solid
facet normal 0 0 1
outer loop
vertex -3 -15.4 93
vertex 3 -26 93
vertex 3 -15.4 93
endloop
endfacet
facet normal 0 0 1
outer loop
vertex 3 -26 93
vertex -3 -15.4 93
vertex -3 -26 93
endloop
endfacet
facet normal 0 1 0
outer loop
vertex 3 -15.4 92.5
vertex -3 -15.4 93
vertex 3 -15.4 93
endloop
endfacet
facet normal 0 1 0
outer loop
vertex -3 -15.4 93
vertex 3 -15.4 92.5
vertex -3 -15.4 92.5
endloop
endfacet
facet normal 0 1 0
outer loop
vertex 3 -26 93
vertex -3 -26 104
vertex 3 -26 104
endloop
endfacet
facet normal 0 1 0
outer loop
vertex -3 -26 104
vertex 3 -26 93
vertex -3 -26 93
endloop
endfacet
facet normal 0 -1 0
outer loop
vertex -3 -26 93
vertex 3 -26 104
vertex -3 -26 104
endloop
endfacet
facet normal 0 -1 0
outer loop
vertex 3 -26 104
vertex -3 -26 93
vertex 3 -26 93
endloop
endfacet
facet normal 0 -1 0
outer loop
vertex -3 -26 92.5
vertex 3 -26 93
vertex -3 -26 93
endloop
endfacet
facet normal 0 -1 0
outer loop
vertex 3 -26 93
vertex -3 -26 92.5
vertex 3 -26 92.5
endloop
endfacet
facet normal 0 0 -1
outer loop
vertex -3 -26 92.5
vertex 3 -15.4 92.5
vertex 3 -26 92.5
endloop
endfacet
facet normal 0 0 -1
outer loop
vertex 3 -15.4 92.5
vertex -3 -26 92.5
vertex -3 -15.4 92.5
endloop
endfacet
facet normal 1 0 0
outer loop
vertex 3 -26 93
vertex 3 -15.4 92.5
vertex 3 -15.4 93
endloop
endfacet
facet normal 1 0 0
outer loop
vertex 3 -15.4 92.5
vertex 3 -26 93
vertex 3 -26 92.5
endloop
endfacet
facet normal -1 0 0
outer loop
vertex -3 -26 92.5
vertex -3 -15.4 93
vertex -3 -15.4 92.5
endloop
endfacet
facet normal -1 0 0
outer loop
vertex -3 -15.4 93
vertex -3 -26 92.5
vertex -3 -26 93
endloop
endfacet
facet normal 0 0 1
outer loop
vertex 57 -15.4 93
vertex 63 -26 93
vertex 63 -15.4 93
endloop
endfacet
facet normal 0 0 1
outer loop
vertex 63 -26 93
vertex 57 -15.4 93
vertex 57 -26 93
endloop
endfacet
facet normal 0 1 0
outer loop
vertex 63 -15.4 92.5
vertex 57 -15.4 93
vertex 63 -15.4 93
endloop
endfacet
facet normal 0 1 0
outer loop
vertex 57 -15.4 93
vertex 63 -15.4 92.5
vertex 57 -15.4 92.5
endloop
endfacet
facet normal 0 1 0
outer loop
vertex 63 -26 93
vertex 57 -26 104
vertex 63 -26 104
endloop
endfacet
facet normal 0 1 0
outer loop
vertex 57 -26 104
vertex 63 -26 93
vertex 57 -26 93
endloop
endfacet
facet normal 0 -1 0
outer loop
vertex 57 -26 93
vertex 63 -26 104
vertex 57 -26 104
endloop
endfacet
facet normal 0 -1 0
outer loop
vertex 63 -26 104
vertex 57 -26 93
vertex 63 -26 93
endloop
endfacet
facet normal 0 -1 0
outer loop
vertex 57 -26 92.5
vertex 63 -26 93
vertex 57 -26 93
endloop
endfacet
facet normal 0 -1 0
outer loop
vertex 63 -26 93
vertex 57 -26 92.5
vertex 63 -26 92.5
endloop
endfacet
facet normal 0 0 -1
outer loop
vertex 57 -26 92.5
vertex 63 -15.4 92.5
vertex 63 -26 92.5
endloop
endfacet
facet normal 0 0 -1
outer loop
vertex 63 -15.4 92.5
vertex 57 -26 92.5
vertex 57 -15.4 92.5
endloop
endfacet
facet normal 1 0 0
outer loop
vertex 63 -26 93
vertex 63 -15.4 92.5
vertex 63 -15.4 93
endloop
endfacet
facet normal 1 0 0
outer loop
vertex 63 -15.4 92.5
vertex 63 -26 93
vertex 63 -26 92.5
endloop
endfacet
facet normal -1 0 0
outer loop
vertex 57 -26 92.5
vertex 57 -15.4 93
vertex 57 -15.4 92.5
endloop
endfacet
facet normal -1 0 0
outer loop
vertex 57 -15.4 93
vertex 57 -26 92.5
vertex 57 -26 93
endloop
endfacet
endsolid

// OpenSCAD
// file: ../stage.scad
// ============================================================
//  Positioning stage: base (X dovetail) -> x-slider with column
//  (Z dovetail) -> z-slider (payload face toward +Y) + column cap.
//  Every axis: M3 adjust screw captured in the fixed part by head +
//  nylock, threading into a captive nut in the moving part
//  (0.5 mm/turn, both directions), plus an M3 lock screw.
//  Modules model parts in stage-local coordinates at mid travel.
// ============================================================
include <lib.scad>

// Dovetail standing on the column's +Y face, running along Z.
// multmatrix maps (x,y,z) -> (y,z,x): run->Z, width->X, height->Y.
module zrail_frame() { multmatrix([[0,1,0,0],[0,0,1,0],[1,0,0,0]]) children(); }

module stage_base() {
    rail_x0 = -stage_L / 2;
    rail_len = stage_L - stage_tab_t;
    tab_h = stage_base_h + xs_screw_z + 6;
    difference() {
        union() {
            translate([-stage_L / 2, -stage_D / 2, 0]) cube([stage_L, stage_D, stage_base_h]);
            translate([rail_x0, 0, stage_base_h]) dovetail_rail(rail_len);
            // adjust-screw tab
            translate([stage_L / 2 - stage_tab_t, -8, 0]) cube([stage_tab_t, 16, tab_h]);
        }
        wood_screw_holes(stage_mount_pts, stage_base_h, cbore = 3);
        // X adjust screw through tab (head outside, nylock inside)
        translate([stage_L / 2 - stage_tab_t - 1, 0, stage_base_h + xs_screw_z])
            rotate([0, 90, 0]) screw_hole(m3_d, stage_tab_t + 2);
    }
}

// Upper stack shares the x-slider's X offset.
module stage_x_slider() {
    x0 = xs_xc - xs_len / 2;
    difference() {
        union() {
            translate([x0, -xs_w / 2, stage_base_h]) cube([xs_len, xs_w, xs_h]);
            // column
            translate([xs_xc - col_w / 2, col_y0, xs_top - 0.01]) cube([col_w, col_t, col_h + 0.01]);
            translate([xs_xc, col_y1, xs_top]) zrail_frame() dovetail_rail(col_h);
        }
        translate([x0 - 1, 0, stage_base_h]) dovetail_slot(xs_len + 2);
        // X adjust: screw enters +X face, nut dropped in from the top
        translate([x0 + xs_len + 0.01, 0, stage_base_h + xs_screw_z]) rotate([0, -90, 0])
            screw_hole(m3_d, xs_adj_hole);
        translate([x0 + xs_len - 6 - m3_nut_t / 2, -(m3_nut_af + clr) / 2, stage_base_h + xs_screw_z - 3.5])
            cube([m3_nut_t + 0.4, m3_nut_af + clr, xs_h]);
        // X lock: horizontal from +Y face onto rail flank, nut from top
        translate([xs_xc + 8, xs_w / 2 + 0.01, stage_base_h + 2.5]) rotate([90, 0, 0])
            screw_hole(m3_d, xs_w / 2 - 3);
        translate([xs_xc + 8 - (m3_nut_af + clr) / 2, 9 - (m3_nut_t + 0.4) / 2, stage_base_h + 2.5 - 3.3])
            cube([m3_nut_af + clr, m3_nut_t + 0.4, xs_h]);
        // cap screws (tapped into column top)
        for (sx = [-8, 8]) translate([xs_xc + sx, col_y0 + 5, col_top - 10])
            screw_hole(m3_tap, 10.1);
    }
}

module stage_z_slider() {
    y0 = col_y1;
    x0 = xs_xc - zs_w / 2;
    difference() {
        translate([x0, y0, zs_z0]) cube([zs_w, zs_t, zs_h]);
        translate([xs_xc, col_y1, zs_z0 - 1]) zrail_frame() dovetail_slot(zs_h + 2);
        // payload holes + nut slots from the bottom
        for (p = payload_pts) {
            translate([xs_xc + p[0], payload_face_y + 0.01, stage_payload_z + p[1]])
                rotate([90, 0, 0]) screw_hole(m3_d, 7.5);
            translate([xs_xc + p[0] - (m3_nut_af + clr) / 2, payload_face_y - 4 - (m3_nut_t + 0.4) / 2, zs_z0 - 1])
                cube([m3_nut_af + clr, m3_nut_t + 0.4, zs_h / 2 + 1 + 3.3]);
        }
        // Z adjust: through hole, nut slot from the -X side 5 below the top
        translate([xs_xc + zs_screw_x, zs_screw_y, zs_z0 + zs_h - zs_adj_hole]) screw_hole(m3_d, zs_adj_hole + 0.1);
        translate([x0 - 1, zs_screw_y - (m3_nut_af + clr) / 2, zs_z0 + zs_h - 5 - (m3_nut_t + 0.4) / 2])
            cube([zs_screw_x + zs_w / 2 + 1 + (m3_nut_af + clr) / 2, m3_nut_af + clr, m3_nut_t + 0.4]);
        // Z lock: from the +X (outward) side onto the rail flank, nut dropped in from the top
        lz = zs_z0 + zs_h - 5;
        x1 = x0 + zs_w;
        translate([x1 + 0.01, col_y1 + 2, lz]) rotate([0, -90, 0]) screw_hole(m3_d, zs_w / 2 - 4);
        translate([x1 - 2.5 - (m3_nut_t + 0.4), col_y1 + 2 - zl_pocket_w / 2, lz - (m3_nut_af + clr) / 2 / cos(30)])
            cube([m3_nut_t + 0.4, zl_pocket_w, zs_h]);
    }
}

module stage_z_cap() {
    difference() {
        // stops 1 mm short of the payload face so the payload never rubs it
        translate([xs_xc - col_w / 2, col_y0, col_top]) cube([col_w, payload_face_y - col_y0 - 1, cap_t]);
        for (sx = [-8, 8]) translate([xs_xc + sx, col_y0 + 5, col_top]) screw_hole(m3_d, cap_t);
        translate([xs_xc + zs_screw_x, zs_screw_y, col_top]) screw_hole(m3_d, cap_t);
    }
}

// ---- placed at a fine-travel offset (dx, dz) ----
module stage_x_slider_placed(dx = 0) { translate([dx, 0, 0]) stage_x_slider(); }
module stage_z_cap_placed(dx = 0)    { translate([dx, 0, 0]) stage_z_cap(); }
module stage_z_slider_placed(dx = 0, dz = 0) { translate([dx, 0, dz]) stage_z_slider(); }

// Children placed at the payload face centre (origin on the face, +Y out).
module stage_payload_origin(dx = 0, dz = 0) {
    translate([xs_xc + dx, payload_face_y, stage_payload_z + dz]) children();
}

// Optional mirror (tower B) wraps the stage-local geometry.
module stage_hand(mir) { if (mir) mirror([1, 0, 0]) children(); else children(); }

module stage_assembly(dx = 0, dz = 0) {
    color("SteelBlue") stage_base();
    color("LightSteelBlue") stage_x_slider_placed(dx);
    color("SkyBlue") stage_z_cap_placed(dx);
    color("CadetBlue") stage_z_slider_placed(dx, dz);
}

// ---- travel checks ----
_right_gap = (stage_L / 2 - stage_tab_t) - (xs_xc + xs_len / 2) - locknut_t;
_left_ok   = 10;   // slider may overhang the rail start by up to 10 mm
echo("CHECK", "stage_travel_x", 2 * min(_right_gap, _left_ok));
// adjust screws: head on the fixed tab/cap, tip must pass the moving nut
// at the far travel end and stay inside the hole at the near end
_xnut = xs_xc + xs_len / 2 - 6;                  // nut centre X at mid
_xtip = stage_L / 2 - x_adj_len;
echo("CHECK", "x_adj_engage", (_xnut - stage_travel - (m3_nut_t + 0.4) / 2) - _xtip);
echo("CHECK", "x_adj_hole", _xtip - (xs_xc + xs_len / 2 + stage_travel - xs_adj_hole));
_znut = zs_z0 + zs_h - 5;
_ztip = stage_top_z - z_adj_len;
echo("CHECK", "z_adj_engage", (_znut - stage_travel - (m3_nut_t + 0.4) / 2) - _ztip);
echo("CHECK", "z_adj_hole", _ztip - (zs_z0 + zs_h + stage_travel - zs_adj_hole));
echo("CHECK", "z_lock_pocket_w", zl_pocket_w);
echo("CHECK", "stage_travel_z", 2 * min(stage_gap_z, cap_gap - locknut_t));
// file: ../axes.scad
// ============================================================
//  Plug carriage: X base (fixed, X servo) -> X carriage (rack on
//  its -Y face, Y servo) -> Y carriage (rack on its -X face, male
//  stage pad, cable pillar).
//  World coords; carriage modules take x_pos (plug X) / y_pos.
// ============================================================
include <stage.scad>

runner_w = 10;     // plain (non-dovetail) rear X runner
runner_h = dt_h;

// ---------------- X base ----------------
xb_x0 = x_rail_x0 - 6;
xb_x1 = x_rail_x0 + x_rail_len + 6;
xb_y0 = x_shaft_y - servo_body[0] + servo_shaft_off - 12;
xb_y1 = xc_y1;
xb_screws = [[xb_x0 + 7, xb_y0 + 7], [xb_x1 - 7, xb_y0 + 7],
             [xb_x0 + 7, xb_y1 - 7], [xb_x1 - 7, xb_y1 - 7],
             [(xb_x0 + xb_x1) / 2, xb_y1 - 7]];

module x_servo_holder_world() {
    at_inverted_servo(x_shaft_x, x_shaft_y, x_pinion_z0, 90) mg995_holder();
}
// Holder floor-screw holes, mapped from the holder frame to the floor.
module x_holder_floor_holes() {
    at_inverted_servo(x_shaft_x, x_shaft_y, x_pinion_z0, 90) translate([0, 0, holder_floor_up])
        mirror([0, 0, 1]) translate([0, 0, -xb_t]) holder_floor_holes(xb_t);
}
module x_servo_world() {
    at_inverted_servo(x_shaft_x, x_shaft_y, x_pinion_z0, 90) mg995_model();
    x_servo_holder_world();
}
module x_pinion_world() {
    translate([x_shaft_x, x_shaft_y, x_pinion_z0]) color("Gold") pinion();
}

module x_base() {
    difference() {
        union() {
            translate([xb_x0, xb_y0, 0]) cube([xb_x1 - xb_x0, xb_y1 - xb_y0, xb_t]);
            translate([x_rail_x0, x_rail_y[1], xb_t]) dovetail_rail(x_rail_len);
            translate([x_rail_x0, x_rail_y[0] - runner_w / 2, xb_t - 0.01])
                cube([x_rail_len, runner_w, runner_h + 0.01]);
        }
        wood_screw_holes(xb_screws, xb_t, cbore = 2);
        x_holder_floor_holes();
        // pinion clearance pocket (keeps the plate clear of the gear)
        translate([x_shaft_x, x_shaft_y, xb_t - 1]) cylinder(r = pinion_pd / 2 + gear_mod + 1, h = 2);
        // servo-lead exit notch at the rear edge, plus zip-tie slots
        translate([x_shaft_x - 6, xb_y0 - 1, -1]) cube([12, 8, xb_t + 2]);
        for (dx = [-10, 10]) translate([x_shaft_x + dx - 1.5, xb_y0 + 12, -1]) cube([3, 5, xb_t + 2]);
    }
}

// ---------------- X carriage (modelled at x_pos = 0) ----------------
module y_servo_holder_local() {
    at_inverted_servo(y_shaft_x_rel, y_shaft_y, y_pinion_z0, 90) mg995_holder();
}
module y_holder_floor_holes() {
    at_inverted_servo(y_shaft_x_rel, y_shaft_y, y_pinion_z0, 90) translate([0, 0, holder_floor_up])
        mirror([0, 0, 1]) translate([0, 0, -xc_h]) holder_floor_holes(xc_h);
}
module y_servo_local() {
    at_inverted_servo(y_shaft_x_rel, y_shaft_y, y_pinion_z0, 90) mg995_model();
}

module x_carriage() {
    difference() {
        union() {
            translate([xc_x0, xc_y0, xc_z0]) cube([xc_len, xc_y1 - xc_y0, xc_h]);
            // X rack on the -Y face, teeth toward -Y
            translate([xc_x0, xc_y0 + 0.01, x_rack_z0]) mirror([0, 1, 0]) rack(xc_len, base_h = rack_base);
            // Y rail on top, under the Y carriage
            translate([-xs_xc, xc_y0, xc_top]) rotate([0, 0, 90]) dovetail_rail(xc_y1 - xc_y0);
        }
        y_holder_floor_holes();
        translate([xc_x0 - 1, x_rail_y[1], xc_z0]) dovetail_slot(xc_len + 2);
        translate([xc_x0 - 1, x_rail_y[0] - runner_w / 2 - clr - 0.15, xc_z0 - 1])
            cube([xc_len + 2, runner_w + 2 * clr + 0.3, runner_h + clr + 1]);
        translate([xc_x0 - 1, x_rail_y[0], xc_z0]) rotate([90, 0, 90]) linear_extrude(xc_len + 2)
            chamfer_mouth(runner_w + 2 * clr + 0.3);
        // lightening / Y-servo lead pass-through + zip-tie slots
        translate([y_shaft_x_rel - 6, xc_y0 + 3, xc_top - 4]) cube([12, 6, 5]);
        for (dy = [12, 24]) translate([xc_x0 + 3, xc_y0 + dy, xc_z0 + runner_h + 2]) cube([5, 3, xc_h]);
    }
}
module x_carriage_world(x_pos) { translate([x_pos, 0, 0]) x_carriage(); }
module y_servo_world(x_pos) { translate([x_pos, 0, 0]) { y_servo_local(); y_servo_holder_local(); } }
module y_pinion_world(x_pos) {
    translate([x_pos + y_shaft_x_rel, y_shaft_y, y_pinion_z0]) color("Gold") pinion();
}

echo("CHECK", "x_rail_len", x_rail_len);
// X base front edge to the port towers' base front edge (Y)
echo("CHECK", "xbase_tower_gap", (tower_y - stage_D / 2) - xb_y1);
echo("CHECK", "x_mesh_gap", (x_pitch_y - x_shaft_y) - pinion_pd / 2);
echo("CHECK", "x_travel_needed", x_pos_max - x_pos_min);

// ---------------- Y carriage (coords relative to male stage origin
//                  in X/Y, world Z) ----------------
pillar_w   = 16;
// top of the flexure frame (mirrors plug_mount.scad) + 6 so the cable clears it
pillar_top = port_z + plug_drop - 1 + flex_isl_h + 6 + 5 + 6;

module y_carriage() {
    difference() {
        union() {
            translate([yc_x0, yc_y0, yc_z0]) cube([yc_x1 - yc_x0, yc_len, yc_h]);
            // Y rack on the -X face, teeth toward -X
            translate([yc_x0 + 0.01, yc_y0, y_rack_z0]) rotate([0, 0, 90]) rack(yc_len, base_h = rack_base);
            // cable strain-relief pillar at the rear, in line with the plug
            translate([xs_xc - pillar_w / 2, yc_y0, yc_z0]) cube([pillar_w, yc_pillar_d, pillar_top - yc_z0]);
        }
        translate([0, yc_y0 - 1, yc_z0]) rotate([0, 0, 90]) dovetail_slot(yc_len + 2);
        // M4 bolts up through captive nuts into the stage base
        for (p = stage_mount_pts) translate([p[0], p[1], yc_z0]) {
            screw_hole(m4_d, yc_h);
            translate([0, 0, -0.01]) m4_nut_trap(m4_nut_t + 0.5);
        }
        // two zip-tie slots through the pillar, near its front face
        for (dz = [6, 18]) translate([xs_xc - pillar_w / 2 - 1, yc_y0 + yc_pillar_d - 5.5, pillar_top - dz])
            cube([pillar_w + 2, 3, 5]);
    }
}
module y_carriage_world(x_pos, y_pos) {
    o = ms_origin(x_pos, y_pos);
    translate([o[0], o[1], 0]) y_carriage();
}

echo("CHECK", "m4_stage_bolt_protrude", m4_stage_bolt_len - ((stage_base_h - 3) + yc_h));
echo("CHECK", "y_mesh_gap", ((y_pitch_x_rel - xs_xc) - y_shaft_x_rel) - pinion_pd / 2);
echo("CHECK", "pillar_top_z", pillar_top);
echo("CHECK", "pillar_min", port_z + 25);
// rack length left past the pinion centre at the worst travel end
echo("CHECK", "x_rack_engage_min",
     min(x_shaft_x - (x_pos_max + xc_x0), (x_pos_min + xc_x1) - x_shaft_x));
echo("CHECK", "y_rack_engage_min",
     min(y_shaft_y - (ms_origin(0, y_travel)[1] + yc_y0), (ms_origin(0, 0)[1] + yc_y1) - y_shaft_y));
// file: ../port_tower.scad
// ============================================================
//  Female port tower: positioning stage (rotated 180 deg so its
//  payload face looks toward -Y) + bracket plate with the keyed
//  D-hole. The bulkhead goes in from the back (flange behind the
//  plate), nut on the front. Plate front face is at world y=0.
// ============================================================
include <stage.scad>

bracket_w      = 36;
bracket_hole_dz = port_z - stage_payload_z;   // hole above payload centre
bracket_bot    = -zs_h / 2;
bracket_top    = bracket_hole_dz + bh_nut_af / cos(30) / 2 + 3;
rib_t          = 5;     // rib width (X)
rib_d          = 7;     // rib depth (out of the plate front)

// Payload-face coordinates: origin at face centre, +Y away from the stage.
module port_bracket() {
    difference() {
        union() {
            translate([-bracket_w / 2, 0, bracket_bot]) cube([bracket_w, plate_t, bracket_top - bracket_bot]);
            // stiffening ribs, outboard of the nut and clear of the plug clamp
            for (sx = [-1, 1])
                translate([sx > 0 ? bracket_w / 2 - rib_t : -bracket_w / 2, plate_t - 0.01, bracket_bot])
                    hull() {
                        cube([rib_t, rib_d, 1]);
                        translate([0, 0, bracket_hole_dz - 14]) cube([rib_t, 0.01, 1]);
                    }
        }
        // keyed D-hole, flat on top
        translate([0, plate_t, bracket_hole_dz]) rotate([90, 0, 0]) d_hole(t = plate_t);
        // mounting screws into the z-slider's captive nuts
        for (p = payload_pts) translate([p[0], -0.01, p[1]]) rotate([-90, 0, 0]) {
            screw_hole(m3_d, plate_t + rib_d);
        }
    }
}

// Whole tower in world coordinates at fine-travel offset (dx, dz),
// measured in world X / Z.
// Tower B (i=1) is the mirror image so its X adjust screw faces outward.
module port_tower_world(i, dx = 0, dz = 0) {
    ldx = i == 0 ? -dx : dx;   // world dx -> stage-local dx
    translate([tower_x(i), tower_y, 0]) rotate([0, 0, 180]) stage_hand(i == 1) {
        stage_assembly(ldx, dz);
        stage_payload_origin(ldx, dz) color("Orange") port_bracket();
    }
}

// Bulkhead connector stand-in (for checks / preview), world coords.
module bulkhead_world(i, dx = 0, dz = 0) {
    translate([port_x[i] + dx, port_face_y, port_z + dz]) rotate([90, 0, 0]) color("DimGray") {
        cylinder(d = bh_thread_d, h = bh_thread_len - plate_t);                   // thread + face
        cylinder(d = bh_nut_af / cos(30), h = bh_nut_t, $fn = 6);                  // nut
        translate([0, 0, -plate_t - 2]) cylinder(d = bh_flange_d, h = 2);          // flange
        translate([0, 0, -plate_t - 40]) cylinder(d = 14, h = 38);                 // body
    }
}

echo("CHECK", "port_z", port_z);
// file: ../plug_mount.scad
// ============================================================
//  Male plug mount: flexure (frame + 4 L-beams + floating island with
//  the clamp cradle built in), clamp cap, and two identical stop
//  straps (front + back) whose pins limit X/Z float to +/-flex_float
//  and whose 1 mm standoff limits Y float to +/-flex_stop_gap.
//  Local coords: origin at the stage payload face centre, +Y away from
//  the stage, Z relative to the payload centre.
// ============================================================
include <port_tower.scad>
include <axes.scad>

plug_dz  = port_z - (yc_top + stage_payload_z);   // plug centre above payload centre
blk_x    = plug_bx / 2 + 0.1;           // snug in X
blk_y0   = flex_t + clamp_wall;                   // block back face
blk_y1   = blk_y0 + plug_by;                // block front face
blk_z0   = plug_dz + plug_drop;                   // block bottom
blk_z1   = blk_z0 + plug_block[2];
crad_x   = blk_x + 5;                             // cradle half width
crad_y1  = blk_y1 - 0.4;                          // cradle stops short: cap clamps the block
cap_back_y = crad_y1;
crad_scr = blk_x + 2.5;                           // cradle screw X
clamp_ledge = 0.5;                                // keeps clamp >= 12.5 above plug centre

isl_x    = 19;                                    // island half width
isl_z0   = blk_z0 - 1;
isl_z1   = isl_z0 + flex_isl_h;
flex_g   = 6;                                     // island-to-frame gap
in_x     = isl_x + flex_g;
in_z0    = isl_z0 - flex_g;
in_z1    = isl_z1 + flex_g;
fr_bar   = 5;
fr_x     = in_x + fr_bar;
fr_z0    = -zs_h / 2;
fr_z1    = in_z1 + fr_bar;

pin_d    = 4;
pin_z    = isl_z1 - 4;
pin_hole = pin_d + 2 * flex_float;
strap_w  = 8;
strap_t  = 3;
strap_foot_w = 18;
strap_z0 = pin_z - 4;
strap_scr = [-5, 5];                              // strap screw X (through the top bar)
strap_scr_z = (in_z1 + fr_z1) / 2;

// one L-beam: island bottom face -> down -> outward -> up -> frame side
leg = 3;
function beam_path(sx, sz) = let(zc = (isl_z0 + isl_z1) / 2,
    zi = sz < 0 ? isl_z0 : isl_z1,
    zh = zi + sz * leg,
    zv = zc + sz * (flex_g - 2 + 0.5),
    xv = sx * (isl_x + leg))
    [[sx * 10, zi], [sx * 10, zh], [xv, zh], [xv, zv], [sx * in_x, zv]];

module poly_beam(pts, w) {
    for (k = [0:len(pts) - 2]) hull() {
        translate(pts[k]) square(w, center = true);
        translate(pts[k + 1]) square(w, center = true);
    }
}

// XZ outline helpers: 2D (x, z) extruded along +Y from y0, thickness t
module xz_extrude(y0, t) { translate([0, y0 + t, 0]) rotate([90, 0, 0]) linear_extrude(t) children(); }

module plug_flexure() {
    difference() {
        union() {
            xz_extrude(0, flex_t) {
                difference() {
                    translate([-fr_x, fr_z0]) square([2 * fr_x, fr_z1 - fr_z0]);
                    translate([-in_x, in_z0]) square([2 * in_x, in_z1 - in_z0]);
                }
                translate([-isl_x, isl_z0]) square([2 * isl_x, isl_z1 - isl_z0]);
                for (sx = [-1, 1], sz = [-1, 1]) poly_beam(beam_path(sx, sz), flex_beam_w);
            }
            // clamp cradle on the island front: back wall + side walls
            translate([-crad_x, flex_t - 0.01, blk_z0]) cube([2 * crad_x, clamp_wall + 0.01, plug_block[2]]);
            for (sx = [-1, 1]) translate([sx > 0 ? blk_x : -crad_x, blk_y0 - 0.01, blk_z0])
                cube([crad_x - blk_x, crad_y1 - blk_y0 + 0.01, plug_block[2]]);
            // Z retention: thin ledge under the block, lips over its top corners
            translate([-crad_x, blk_y0 - 0.01, blk_z0 - clamp_ledge]) cube([2 * crad_x, crad_y1 - blk_y0 + 0.01, clamp_ledge]);
            for (sx = [-1, 1]) translate([sx > 0 ? blk_x - 1 : -crad_x, blk_y0 - 0.01, blk_z1])
                cube([crad_x - blk_x + 1, crad_y1 - blk_y0 + 0.01, 1.5]);
        }
        // payload screws into the stage z-slider
        for (p = payload_pts) translate([p[0], -0.01, p[1]]) rotate([-90, 0, 0]) screw_hole(m3_d, flex_t);
        // stop-pin hole (through) and strap screws (through the top bar)
        translate([0, -0.01, pin_z]) rotate([-90, 0, 0]) screw_hole(pin_hole, flex_t);
        for (x = strap_scr) translate([x, -0.01, strap_scr_z]) rotate([-90, 0, 0]) screw_hole(m3_d, flex_t);
        // cap screws, tapped into the cradle side walls
        for (sx = [-1, 1]) translate([sx * crad_scr, crad_y1 + 0.01, (blk_z0 + blk_z1) / 2])
            rotate([90, 0, 0]) screw_hole(m3_tap, crad_y1 - flex_t + 1);
    }
}

// Clamp cap: 1.5 mm over the block, thicker over the screws.
module plug_clamp_cap() {
    // flat back at the cradle front: squeezes the block (it stands 0.4 proud)
    difference() {
        union() {
            translate([-crad_x, cap_back_y, blk_z0]) cube([2 * crad_x, blk_y1 - cap_back_y + clamp_lip_t, plug_block[2]]);
            for (sx = [-1, 1]) translate([sx > 0 ? blk_x : -crad_x, cap_back_y, blk_z0])
                cube([crad_x - blk_x, 4, plug_block[2]]);
        }
        for (sx = [-1, 1]) translate([sx * crad_scr, cap_back_y - 0.01, (blk_z0 + blk_z1) / 2])
            rotate([-90, 0, 0]) screw_hole(m3_d, 5);
    }
}

// Stop strap in its own frame: back face on y=0, pin toward -Y.
module plug_flex_stop() {
    difference() {
        union() {
            translate([-strap_w / 2, 0, strap_z0]) cube([strap_w, strap_t, fr_z1 - strap_z0]);
            translate([-strap_foot_w / 2, -flex_stop_gap, in_z1]) cube([strap_foot_w, strap_t + flex_stop_gap, fr_z1 - in_z1]);
            translate([0, 0.01, pin_z]) rotate([90, 0, 0]) cylinder(d = pin_d, h = flex_stop_gap + 2);
        }
        for (x = strap_scr) translate([x, -flex_stop_gap - 0.01, strap_scr_z]) rotate([-90, 0, 0])
            screw_hole(m3_d, strap_t + flex_stop_gap);
    }
}

module plug_flex_stops_placed() {
    translate([0, flex_t + flex_stop_gap, 0]) plug_flex_stop();                       // front
    translate([0, -flex_stop_gap, 0]) mirror([0, 1, 0]) plug_flex_stop();            // back
}

module plug_body_local() {
    color("White") {
        translate([-plug_bx / 2, blk_y0, blk_z0]) cube([plug_bx, plug_by, plug_block[2]]);
        translate([0, blk_y0 + plug_by / 2, blk_z1]) cylinder(d = 4.5, h = 15);              // cable
        hull() {
            translate([-plug_bx / 2, blk_y0, plug_dz - 4]) cube([plug_bx, plug_by, blk_z0 - plug_dz + 4]);
            translate([0, blk_y1 + plug_head_proj - 1, plug_dz]) rotate([-90, 0, 0]) cylinder(d = 8, h = 1);
        }
    }
}

// Everything that moves with the plug carriage, minus the plug itself.
module plug_mount_world(x_pos, y_pos, dx = 0, dz = 0) {
    o = ms_origin(x_pos, y_pos);
    translate(o) {
        stage_assembly(dx, dz);
        stage_payload_origin(dx, dz) {
            color("Orange") plug_flexure();
            color("Gold") plug_clamp_cap();
            color("Khaki") plug_flex_stops_placed();
        }
    }
}
module plug_body_world(x_pos, y_pos, dx = 0, dz = 0) {
    o = ms_origin(x_pos, y_pos);
    translate(o) stage_payload_origin(dx, dz) plug_body_local();
}

// ---- checks ----
echo("CHECK", "clamp_lip_t", clamp_lip_t);
echo("CHECK", "clamp_preload", blk_y1 - cap_back_y);
echo("CHECK", "clamp_x_play", blk_x - plug_bx / 2);
echo("CHECK", "pillar_above_flex", pillar_top - (yc_top + stage_payload_z + fr_z1));
echo("CHECK", "clamp_bottom_above_plug", blk_z0 - clamp_ledge - plug_dz);
echo("CHECK", "plug_insert_err",
     (ms_origin(0, y_travel)[1] + payload_face_y + blk_y1 + plug_head_proj) - bh_face_y);
echo("CHECK", "flex_xz_stop", (pin_hole - pin_d) / 2);
// beam-to-island and beam-to-frame clearance must exceed the stop travel
echo("CHECK", "flex_beam_clear", leg - flex_beam_w / 2);
// file: ../assembly_lib.scad
// World-placement groups shared by assembly.scad and the full-machine
// collision test. Pinions are left out of these groups because they
// mesh with the racks by design.
include <plug_mount.scad>

module fixed_world() {
    for (i = [0, 1]) { port_tower_world(i); bulkhead_world(i); }
    color("Tan") x_base();
    x_servo_world();
}

module moving_world(x_pos, y_pos) {
    color("LightGreen") x_carriage_world(x_pos);
    y_servo_world(x_pos);
    color("Yellow") y_carriage_world(x_pos, y_pos);
    plug_mount_world(x_pos, y_pos);
}
// file: probe_lib.scad
// Fit probes built only from the port position and the measured part
// sizes (not from the bracket / clamp variables), so they test the real
// geometry rather than restating its formulas.
include <../assembly_lib.scad>

// Bulkhead thread cross-section (15 mm, flat 6.5 mm from centre, on top)
// pushed through port i's plate, offset by d = [dx, dz].
module probe_port_thread(i, d) {
    translate([port_x[i] + d[0], port_face_y + plate_t + 1, port_z + d[1]]) rotate([90, 0, 0])
        linear_extrude(plate_t + 2) intersection() {
            circle(d = bh_thread_d, $fn = 96);
            translate([-bh_thread_d, -bh_thread_d]) square([2 * bh_thread_d, bh_thread_d + bh_flat]);
        }
}
module probe_port_hole(d) {
    for (i = [0, 1]) intersection() { port_tower_world(i); probe_port_thread(i, d); }
}

// Plug clamp block where it must sit for the magnetic face to meet port
// i's face: face centre at (port_x, bh_face_y, port_z).
module probe_block(i, d) {
    translate([port_x[i] - plug_bx / 2 + d[0],
               bh_face_y - plug_head_proj - plug_by + d[1],
               port_z + plug_drop + d[2]])
        cube([plug_bx, plug_by, plug_block[2]]);
}
// Seat = flexure cradle only (the cap squeezes the block on purpose).
module probe_plug_seat(d) {
    for (i = [0, 1]) intersection() {
        translate(ms_origin(port_x[i], y_travel)) stage_payload_origin() plug_flexure();
        probe_block(i, d);
    }
}
// main file
// 1 mm low: must hit the ledge.
include <probe_lib.scad>
probe_plug_seat([0, 0, -1]);
